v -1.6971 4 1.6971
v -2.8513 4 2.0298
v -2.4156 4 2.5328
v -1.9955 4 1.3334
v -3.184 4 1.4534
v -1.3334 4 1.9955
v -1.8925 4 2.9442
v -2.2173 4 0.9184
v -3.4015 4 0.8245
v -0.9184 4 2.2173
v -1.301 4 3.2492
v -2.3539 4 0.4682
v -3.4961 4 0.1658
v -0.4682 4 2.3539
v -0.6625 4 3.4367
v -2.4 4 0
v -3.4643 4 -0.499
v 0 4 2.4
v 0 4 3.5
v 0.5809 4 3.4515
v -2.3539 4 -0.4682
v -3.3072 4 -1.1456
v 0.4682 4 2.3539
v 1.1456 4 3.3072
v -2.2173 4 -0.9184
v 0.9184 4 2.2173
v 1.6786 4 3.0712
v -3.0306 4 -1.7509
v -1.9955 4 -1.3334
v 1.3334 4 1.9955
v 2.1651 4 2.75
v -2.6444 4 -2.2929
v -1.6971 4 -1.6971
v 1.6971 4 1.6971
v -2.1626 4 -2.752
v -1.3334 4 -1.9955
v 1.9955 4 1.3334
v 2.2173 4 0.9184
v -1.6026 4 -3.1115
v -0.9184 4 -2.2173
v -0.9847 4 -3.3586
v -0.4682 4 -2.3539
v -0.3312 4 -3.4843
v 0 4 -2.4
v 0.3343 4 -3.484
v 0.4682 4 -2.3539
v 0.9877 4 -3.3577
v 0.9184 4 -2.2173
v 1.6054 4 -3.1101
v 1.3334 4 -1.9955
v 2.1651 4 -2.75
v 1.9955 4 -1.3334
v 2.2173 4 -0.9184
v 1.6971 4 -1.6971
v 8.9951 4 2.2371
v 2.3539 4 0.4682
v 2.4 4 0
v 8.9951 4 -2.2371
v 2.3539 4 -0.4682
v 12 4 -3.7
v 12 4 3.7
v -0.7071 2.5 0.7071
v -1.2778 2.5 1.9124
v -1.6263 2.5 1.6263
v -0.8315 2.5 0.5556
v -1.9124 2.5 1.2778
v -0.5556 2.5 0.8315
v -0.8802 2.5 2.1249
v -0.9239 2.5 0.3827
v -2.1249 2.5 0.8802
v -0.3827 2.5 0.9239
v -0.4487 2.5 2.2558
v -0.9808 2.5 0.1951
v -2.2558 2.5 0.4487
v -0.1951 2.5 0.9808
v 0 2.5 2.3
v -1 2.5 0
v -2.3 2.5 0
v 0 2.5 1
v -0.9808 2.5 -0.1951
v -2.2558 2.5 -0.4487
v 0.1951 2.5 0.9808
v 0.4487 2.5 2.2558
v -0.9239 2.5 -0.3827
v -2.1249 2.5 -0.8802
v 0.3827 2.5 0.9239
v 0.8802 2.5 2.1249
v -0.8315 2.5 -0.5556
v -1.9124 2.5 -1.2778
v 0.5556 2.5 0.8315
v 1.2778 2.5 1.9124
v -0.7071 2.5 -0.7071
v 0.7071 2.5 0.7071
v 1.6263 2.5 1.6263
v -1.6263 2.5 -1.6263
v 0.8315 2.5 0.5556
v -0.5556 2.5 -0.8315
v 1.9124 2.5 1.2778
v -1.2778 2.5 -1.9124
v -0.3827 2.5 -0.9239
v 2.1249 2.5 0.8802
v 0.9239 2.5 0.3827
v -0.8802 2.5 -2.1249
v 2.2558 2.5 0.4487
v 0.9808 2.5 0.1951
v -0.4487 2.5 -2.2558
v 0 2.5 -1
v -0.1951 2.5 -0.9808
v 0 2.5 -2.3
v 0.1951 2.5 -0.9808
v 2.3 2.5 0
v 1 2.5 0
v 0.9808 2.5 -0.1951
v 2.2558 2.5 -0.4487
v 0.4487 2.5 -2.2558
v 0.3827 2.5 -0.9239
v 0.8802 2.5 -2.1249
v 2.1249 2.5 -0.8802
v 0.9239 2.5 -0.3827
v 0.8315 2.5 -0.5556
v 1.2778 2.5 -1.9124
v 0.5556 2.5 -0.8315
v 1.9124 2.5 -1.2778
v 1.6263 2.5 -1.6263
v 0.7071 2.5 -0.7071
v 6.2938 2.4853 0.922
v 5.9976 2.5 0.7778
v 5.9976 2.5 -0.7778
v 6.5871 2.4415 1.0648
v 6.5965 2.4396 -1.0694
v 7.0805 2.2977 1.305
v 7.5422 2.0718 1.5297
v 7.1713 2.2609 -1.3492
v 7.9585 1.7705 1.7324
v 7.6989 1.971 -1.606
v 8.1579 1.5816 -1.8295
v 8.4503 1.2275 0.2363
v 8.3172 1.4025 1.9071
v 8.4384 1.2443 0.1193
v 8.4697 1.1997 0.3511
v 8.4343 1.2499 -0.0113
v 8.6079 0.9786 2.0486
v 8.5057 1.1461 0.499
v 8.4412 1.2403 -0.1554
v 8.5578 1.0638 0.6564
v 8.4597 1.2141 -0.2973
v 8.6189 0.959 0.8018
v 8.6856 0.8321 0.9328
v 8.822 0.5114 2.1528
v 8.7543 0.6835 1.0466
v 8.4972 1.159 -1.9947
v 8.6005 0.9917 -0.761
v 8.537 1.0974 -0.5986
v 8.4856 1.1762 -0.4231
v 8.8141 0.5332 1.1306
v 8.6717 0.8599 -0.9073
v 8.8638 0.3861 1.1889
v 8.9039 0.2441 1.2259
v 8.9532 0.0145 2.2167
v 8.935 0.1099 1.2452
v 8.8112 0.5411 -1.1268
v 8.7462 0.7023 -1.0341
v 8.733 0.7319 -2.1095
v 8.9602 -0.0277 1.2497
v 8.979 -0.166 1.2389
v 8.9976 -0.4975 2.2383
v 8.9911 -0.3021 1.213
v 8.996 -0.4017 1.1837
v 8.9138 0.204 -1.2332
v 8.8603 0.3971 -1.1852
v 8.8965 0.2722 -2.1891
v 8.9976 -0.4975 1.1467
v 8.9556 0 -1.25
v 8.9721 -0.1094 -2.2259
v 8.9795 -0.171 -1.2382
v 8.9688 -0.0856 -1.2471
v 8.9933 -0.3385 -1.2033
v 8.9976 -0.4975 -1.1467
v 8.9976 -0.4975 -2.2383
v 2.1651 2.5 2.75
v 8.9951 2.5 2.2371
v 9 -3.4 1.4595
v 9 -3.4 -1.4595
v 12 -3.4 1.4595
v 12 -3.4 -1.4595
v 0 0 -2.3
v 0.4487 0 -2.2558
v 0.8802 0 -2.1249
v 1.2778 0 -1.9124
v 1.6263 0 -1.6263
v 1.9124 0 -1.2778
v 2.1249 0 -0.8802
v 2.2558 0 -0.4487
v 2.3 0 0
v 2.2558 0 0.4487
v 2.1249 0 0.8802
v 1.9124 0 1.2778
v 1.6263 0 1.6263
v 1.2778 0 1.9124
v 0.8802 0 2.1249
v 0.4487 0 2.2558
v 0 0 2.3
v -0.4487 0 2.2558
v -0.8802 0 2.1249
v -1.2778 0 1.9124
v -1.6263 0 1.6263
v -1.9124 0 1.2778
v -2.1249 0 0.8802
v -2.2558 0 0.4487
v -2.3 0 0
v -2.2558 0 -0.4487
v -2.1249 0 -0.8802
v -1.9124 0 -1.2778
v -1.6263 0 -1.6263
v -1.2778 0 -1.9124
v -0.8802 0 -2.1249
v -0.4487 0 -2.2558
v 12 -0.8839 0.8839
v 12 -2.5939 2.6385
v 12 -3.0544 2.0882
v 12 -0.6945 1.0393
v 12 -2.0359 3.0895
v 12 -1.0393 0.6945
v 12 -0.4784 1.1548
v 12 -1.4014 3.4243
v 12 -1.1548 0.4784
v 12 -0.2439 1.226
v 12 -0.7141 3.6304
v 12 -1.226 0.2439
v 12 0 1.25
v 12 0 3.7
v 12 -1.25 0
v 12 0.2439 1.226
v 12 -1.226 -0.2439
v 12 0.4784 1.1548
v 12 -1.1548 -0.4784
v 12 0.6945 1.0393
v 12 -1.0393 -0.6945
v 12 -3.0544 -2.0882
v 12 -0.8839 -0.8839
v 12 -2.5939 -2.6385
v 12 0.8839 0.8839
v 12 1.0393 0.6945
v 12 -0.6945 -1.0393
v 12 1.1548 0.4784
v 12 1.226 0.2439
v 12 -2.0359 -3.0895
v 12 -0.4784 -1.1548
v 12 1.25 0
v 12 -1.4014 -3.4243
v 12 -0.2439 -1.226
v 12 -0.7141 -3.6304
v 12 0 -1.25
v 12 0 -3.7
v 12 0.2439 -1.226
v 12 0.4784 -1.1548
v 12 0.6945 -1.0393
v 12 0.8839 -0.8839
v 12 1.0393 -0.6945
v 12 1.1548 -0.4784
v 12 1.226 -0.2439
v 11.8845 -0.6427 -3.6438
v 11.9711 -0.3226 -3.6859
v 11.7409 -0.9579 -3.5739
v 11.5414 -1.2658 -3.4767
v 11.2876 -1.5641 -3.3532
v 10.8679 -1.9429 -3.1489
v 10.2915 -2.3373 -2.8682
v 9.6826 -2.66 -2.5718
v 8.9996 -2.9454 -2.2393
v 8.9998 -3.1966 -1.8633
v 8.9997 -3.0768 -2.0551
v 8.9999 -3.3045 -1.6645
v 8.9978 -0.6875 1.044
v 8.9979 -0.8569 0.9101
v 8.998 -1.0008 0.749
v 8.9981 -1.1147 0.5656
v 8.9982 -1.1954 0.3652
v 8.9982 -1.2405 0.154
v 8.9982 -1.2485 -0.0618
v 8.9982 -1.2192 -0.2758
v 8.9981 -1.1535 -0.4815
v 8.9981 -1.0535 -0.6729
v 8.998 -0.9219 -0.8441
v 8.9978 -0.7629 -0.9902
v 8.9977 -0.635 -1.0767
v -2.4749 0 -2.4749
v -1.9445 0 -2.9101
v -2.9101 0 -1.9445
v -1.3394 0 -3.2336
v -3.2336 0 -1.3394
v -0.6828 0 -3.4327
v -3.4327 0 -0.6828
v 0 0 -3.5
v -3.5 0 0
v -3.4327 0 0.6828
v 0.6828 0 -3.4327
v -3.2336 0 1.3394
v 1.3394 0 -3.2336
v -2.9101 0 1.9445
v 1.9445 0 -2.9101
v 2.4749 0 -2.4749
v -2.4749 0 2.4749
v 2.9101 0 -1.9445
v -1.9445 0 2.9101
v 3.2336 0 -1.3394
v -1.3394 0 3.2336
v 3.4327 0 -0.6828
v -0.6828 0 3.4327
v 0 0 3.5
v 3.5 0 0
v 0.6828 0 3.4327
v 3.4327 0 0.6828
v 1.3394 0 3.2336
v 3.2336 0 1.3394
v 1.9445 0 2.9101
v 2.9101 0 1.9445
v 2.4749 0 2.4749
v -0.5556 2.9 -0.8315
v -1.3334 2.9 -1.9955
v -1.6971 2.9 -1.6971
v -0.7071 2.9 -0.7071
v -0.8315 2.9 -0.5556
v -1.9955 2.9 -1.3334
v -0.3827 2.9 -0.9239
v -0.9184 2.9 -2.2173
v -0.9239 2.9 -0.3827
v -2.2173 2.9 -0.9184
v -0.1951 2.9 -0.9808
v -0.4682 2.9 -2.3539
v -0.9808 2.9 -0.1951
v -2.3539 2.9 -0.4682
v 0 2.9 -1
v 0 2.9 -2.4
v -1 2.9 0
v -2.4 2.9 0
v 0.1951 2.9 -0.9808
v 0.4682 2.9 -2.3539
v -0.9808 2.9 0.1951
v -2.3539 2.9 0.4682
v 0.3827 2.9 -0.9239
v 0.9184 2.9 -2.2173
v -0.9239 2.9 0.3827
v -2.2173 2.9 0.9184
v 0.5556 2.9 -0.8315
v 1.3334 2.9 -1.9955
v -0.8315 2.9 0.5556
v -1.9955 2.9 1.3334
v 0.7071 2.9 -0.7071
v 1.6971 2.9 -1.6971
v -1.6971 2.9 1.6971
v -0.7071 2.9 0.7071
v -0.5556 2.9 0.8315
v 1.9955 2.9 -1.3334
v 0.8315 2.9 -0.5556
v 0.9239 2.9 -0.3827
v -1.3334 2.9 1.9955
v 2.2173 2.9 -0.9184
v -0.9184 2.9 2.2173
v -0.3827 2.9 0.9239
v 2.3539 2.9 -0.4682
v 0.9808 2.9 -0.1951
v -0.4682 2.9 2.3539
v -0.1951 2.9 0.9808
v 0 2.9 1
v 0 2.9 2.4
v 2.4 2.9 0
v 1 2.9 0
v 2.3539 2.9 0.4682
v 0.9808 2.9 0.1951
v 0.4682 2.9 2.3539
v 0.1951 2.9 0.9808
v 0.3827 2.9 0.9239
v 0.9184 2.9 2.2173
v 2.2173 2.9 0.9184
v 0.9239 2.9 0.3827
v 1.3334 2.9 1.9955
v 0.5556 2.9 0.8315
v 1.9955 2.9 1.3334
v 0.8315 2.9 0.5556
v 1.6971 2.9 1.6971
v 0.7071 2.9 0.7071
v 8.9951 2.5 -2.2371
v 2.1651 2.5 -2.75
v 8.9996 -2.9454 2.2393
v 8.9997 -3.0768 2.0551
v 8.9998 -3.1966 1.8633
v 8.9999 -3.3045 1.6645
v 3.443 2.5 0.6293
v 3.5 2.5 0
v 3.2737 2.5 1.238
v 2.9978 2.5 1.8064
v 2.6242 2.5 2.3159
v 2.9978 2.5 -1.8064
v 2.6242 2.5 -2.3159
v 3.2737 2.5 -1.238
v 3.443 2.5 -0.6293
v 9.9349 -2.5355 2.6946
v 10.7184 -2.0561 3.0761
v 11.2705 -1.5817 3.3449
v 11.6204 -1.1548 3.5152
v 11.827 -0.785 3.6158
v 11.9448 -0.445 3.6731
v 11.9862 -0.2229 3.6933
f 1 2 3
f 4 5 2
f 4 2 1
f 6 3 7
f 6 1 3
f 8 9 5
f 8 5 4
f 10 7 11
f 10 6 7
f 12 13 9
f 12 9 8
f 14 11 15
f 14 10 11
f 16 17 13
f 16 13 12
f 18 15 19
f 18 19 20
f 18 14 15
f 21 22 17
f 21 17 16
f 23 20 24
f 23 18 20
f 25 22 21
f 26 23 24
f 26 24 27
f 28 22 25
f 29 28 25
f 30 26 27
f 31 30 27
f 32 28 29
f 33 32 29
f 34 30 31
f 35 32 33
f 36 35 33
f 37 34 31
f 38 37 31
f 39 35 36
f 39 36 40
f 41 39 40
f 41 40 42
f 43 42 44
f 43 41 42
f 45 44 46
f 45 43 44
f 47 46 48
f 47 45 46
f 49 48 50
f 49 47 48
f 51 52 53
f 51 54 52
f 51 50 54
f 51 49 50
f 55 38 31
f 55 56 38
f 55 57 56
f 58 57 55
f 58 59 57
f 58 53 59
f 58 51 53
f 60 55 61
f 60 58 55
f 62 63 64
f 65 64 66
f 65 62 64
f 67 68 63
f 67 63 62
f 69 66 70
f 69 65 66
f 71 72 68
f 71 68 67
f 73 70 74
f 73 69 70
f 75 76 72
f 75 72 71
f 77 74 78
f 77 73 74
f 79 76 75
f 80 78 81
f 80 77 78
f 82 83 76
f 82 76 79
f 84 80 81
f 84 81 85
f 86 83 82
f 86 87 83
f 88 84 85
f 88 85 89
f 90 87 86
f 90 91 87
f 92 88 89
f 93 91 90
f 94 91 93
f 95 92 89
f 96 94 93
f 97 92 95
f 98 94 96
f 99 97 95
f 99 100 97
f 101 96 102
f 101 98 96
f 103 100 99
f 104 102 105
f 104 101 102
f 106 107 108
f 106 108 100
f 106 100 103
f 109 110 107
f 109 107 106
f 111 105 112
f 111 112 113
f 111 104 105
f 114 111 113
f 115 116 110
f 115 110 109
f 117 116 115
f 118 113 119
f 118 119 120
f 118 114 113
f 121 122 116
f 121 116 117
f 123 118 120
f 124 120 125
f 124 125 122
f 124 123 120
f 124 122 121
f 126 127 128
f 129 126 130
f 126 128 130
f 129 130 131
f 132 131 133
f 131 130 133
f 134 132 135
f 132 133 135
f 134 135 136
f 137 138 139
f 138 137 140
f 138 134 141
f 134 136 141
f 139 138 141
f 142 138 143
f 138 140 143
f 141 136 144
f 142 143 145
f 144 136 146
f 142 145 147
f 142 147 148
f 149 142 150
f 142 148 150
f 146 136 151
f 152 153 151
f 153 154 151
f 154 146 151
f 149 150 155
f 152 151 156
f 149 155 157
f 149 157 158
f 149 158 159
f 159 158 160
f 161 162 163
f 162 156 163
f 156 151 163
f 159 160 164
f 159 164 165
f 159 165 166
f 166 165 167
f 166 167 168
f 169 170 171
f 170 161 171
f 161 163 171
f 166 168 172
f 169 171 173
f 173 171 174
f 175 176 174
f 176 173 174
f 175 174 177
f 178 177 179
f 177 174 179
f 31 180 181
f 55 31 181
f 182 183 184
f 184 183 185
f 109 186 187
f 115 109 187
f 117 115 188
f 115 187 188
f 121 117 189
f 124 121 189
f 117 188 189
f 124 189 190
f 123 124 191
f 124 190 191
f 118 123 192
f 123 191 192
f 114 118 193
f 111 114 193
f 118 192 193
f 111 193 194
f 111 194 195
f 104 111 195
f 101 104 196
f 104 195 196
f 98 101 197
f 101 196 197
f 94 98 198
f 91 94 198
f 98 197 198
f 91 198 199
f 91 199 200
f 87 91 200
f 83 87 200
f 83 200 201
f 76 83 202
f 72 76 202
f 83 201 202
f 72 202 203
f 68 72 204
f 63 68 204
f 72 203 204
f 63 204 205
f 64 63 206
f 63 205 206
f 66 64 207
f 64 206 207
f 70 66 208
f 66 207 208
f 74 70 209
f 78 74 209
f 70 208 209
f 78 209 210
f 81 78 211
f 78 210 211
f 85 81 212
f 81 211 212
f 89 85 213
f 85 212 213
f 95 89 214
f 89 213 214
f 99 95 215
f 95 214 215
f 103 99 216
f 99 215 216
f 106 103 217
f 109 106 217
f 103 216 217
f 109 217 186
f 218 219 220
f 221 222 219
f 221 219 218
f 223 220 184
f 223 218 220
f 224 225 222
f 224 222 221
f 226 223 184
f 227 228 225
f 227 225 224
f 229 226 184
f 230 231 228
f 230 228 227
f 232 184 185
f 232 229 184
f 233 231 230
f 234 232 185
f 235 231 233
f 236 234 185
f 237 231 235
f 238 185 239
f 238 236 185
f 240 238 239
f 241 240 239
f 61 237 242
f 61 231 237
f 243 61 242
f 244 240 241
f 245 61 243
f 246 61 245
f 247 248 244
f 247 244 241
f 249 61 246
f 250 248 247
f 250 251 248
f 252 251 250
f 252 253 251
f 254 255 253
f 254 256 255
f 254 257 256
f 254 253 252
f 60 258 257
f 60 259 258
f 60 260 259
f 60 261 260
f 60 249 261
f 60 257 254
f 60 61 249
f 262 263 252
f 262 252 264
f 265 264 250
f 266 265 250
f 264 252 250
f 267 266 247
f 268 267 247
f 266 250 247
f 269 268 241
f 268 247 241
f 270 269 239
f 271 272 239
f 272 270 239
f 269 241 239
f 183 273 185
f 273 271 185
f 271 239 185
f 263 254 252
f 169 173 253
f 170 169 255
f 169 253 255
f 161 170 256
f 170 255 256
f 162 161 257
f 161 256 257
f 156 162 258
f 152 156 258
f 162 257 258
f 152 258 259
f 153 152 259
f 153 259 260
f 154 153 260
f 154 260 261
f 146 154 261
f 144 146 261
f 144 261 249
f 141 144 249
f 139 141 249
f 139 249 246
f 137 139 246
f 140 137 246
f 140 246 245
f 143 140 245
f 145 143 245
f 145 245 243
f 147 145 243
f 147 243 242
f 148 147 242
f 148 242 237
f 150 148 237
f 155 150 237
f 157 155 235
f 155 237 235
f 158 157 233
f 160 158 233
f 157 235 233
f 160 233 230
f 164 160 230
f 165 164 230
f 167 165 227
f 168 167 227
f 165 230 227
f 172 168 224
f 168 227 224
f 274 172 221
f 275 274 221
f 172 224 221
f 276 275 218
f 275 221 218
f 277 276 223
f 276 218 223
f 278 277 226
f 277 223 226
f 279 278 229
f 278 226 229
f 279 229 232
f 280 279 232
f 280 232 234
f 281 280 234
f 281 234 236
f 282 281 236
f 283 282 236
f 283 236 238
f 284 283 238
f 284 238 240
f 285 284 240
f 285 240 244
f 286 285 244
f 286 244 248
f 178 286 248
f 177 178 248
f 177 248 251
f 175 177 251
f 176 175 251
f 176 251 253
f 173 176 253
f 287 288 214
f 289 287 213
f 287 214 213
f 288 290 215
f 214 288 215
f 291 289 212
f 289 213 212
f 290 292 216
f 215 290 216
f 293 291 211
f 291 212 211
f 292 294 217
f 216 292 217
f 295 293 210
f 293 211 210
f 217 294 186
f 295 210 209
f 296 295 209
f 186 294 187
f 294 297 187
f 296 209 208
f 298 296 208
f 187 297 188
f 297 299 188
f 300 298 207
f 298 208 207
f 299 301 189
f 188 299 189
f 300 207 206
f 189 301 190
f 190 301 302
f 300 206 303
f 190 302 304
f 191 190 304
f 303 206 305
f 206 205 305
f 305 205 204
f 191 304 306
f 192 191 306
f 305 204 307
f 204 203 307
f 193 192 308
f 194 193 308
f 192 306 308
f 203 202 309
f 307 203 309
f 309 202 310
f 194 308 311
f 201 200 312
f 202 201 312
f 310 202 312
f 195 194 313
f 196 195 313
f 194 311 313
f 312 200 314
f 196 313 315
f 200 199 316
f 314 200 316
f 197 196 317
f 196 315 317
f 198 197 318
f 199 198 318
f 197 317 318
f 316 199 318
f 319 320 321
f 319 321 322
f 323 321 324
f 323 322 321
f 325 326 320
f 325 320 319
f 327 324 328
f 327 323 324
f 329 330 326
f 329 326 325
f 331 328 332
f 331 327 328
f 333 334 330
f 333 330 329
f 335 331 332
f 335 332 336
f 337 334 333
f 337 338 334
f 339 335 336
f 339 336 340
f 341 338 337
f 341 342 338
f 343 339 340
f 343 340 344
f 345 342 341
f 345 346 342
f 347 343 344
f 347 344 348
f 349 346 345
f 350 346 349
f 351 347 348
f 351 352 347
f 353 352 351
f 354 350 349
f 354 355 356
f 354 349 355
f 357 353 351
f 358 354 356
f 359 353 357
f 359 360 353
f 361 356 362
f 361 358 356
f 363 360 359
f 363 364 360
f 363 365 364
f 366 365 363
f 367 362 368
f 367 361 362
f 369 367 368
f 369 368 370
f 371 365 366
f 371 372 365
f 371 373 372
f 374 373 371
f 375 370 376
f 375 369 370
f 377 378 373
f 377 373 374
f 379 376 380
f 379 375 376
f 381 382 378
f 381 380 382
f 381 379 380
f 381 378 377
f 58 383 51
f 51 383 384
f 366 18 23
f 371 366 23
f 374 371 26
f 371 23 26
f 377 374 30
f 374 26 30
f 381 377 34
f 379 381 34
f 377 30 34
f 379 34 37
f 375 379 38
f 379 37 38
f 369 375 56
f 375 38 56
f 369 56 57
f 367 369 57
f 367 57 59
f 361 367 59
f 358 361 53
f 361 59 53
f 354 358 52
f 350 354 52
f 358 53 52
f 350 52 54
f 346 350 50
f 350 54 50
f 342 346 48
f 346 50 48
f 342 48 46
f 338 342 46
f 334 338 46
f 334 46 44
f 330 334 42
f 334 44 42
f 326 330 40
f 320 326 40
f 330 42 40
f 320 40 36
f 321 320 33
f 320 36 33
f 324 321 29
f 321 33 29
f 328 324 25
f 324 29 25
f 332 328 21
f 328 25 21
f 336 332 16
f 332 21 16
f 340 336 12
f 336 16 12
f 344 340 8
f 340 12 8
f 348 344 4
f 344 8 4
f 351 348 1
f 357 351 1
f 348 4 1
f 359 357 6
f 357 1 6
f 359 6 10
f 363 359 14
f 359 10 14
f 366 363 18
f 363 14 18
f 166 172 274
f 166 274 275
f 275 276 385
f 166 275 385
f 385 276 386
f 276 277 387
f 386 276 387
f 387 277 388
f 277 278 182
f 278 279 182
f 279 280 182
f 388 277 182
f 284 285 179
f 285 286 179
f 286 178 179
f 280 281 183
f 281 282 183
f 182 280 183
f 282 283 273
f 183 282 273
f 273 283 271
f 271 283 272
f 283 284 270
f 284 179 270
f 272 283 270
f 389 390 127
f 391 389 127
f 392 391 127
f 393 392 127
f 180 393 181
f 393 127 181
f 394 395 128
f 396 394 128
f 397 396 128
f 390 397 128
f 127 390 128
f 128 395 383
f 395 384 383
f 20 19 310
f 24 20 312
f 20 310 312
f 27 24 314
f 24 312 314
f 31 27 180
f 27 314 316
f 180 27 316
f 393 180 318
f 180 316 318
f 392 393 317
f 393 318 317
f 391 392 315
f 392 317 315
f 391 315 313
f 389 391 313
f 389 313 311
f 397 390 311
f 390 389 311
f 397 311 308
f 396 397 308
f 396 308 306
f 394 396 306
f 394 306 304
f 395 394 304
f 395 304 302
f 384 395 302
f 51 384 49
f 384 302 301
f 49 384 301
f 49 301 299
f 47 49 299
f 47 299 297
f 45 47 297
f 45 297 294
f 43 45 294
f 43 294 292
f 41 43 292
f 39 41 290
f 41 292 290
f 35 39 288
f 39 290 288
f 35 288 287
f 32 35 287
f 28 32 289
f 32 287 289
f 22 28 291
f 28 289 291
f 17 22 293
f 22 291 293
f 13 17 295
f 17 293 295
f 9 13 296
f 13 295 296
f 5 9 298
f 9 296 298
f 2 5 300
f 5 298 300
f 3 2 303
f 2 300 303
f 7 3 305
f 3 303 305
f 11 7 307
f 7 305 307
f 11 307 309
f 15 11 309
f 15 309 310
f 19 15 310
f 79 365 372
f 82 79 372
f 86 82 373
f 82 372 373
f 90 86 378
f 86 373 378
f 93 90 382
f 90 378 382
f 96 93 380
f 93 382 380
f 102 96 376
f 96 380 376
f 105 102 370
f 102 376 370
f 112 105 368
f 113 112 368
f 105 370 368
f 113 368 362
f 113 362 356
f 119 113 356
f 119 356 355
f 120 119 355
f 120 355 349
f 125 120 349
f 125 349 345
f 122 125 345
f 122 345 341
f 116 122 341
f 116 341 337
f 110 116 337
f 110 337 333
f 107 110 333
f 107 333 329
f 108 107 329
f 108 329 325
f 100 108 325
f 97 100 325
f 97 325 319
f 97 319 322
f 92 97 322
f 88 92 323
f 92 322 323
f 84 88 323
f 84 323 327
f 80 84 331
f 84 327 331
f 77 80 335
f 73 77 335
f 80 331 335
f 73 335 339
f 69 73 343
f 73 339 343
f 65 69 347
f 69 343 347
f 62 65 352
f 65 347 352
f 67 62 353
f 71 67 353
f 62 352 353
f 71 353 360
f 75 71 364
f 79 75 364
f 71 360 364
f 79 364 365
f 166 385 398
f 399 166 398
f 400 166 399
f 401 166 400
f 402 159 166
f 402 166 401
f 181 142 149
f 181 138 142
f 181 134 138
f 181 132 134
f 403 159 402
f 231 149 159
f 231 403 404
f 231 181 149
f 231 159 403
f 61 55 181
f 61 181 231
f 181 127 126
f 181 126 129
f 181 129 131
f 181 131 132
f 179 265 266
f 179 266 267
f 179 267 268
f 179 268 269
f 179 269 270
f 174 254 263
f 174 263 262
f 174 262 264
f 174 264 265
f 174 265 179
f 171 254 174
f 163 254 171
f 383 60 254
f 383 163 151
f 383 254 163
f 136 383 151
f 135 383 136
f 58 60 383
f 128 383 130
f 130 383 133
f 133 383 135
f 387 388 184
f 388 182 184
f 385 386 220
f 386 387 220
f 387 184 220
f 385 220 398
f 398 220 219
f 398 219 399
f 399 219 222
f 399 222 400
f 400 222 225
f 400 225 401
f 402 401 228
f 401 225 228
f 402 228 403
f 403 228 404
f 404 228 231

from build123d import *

# Parameters (mm, degrees)
SKETCH_1_R               = 3.5
EXTRUDE_1_DEPTH          = 4
SKETCH_2_R               = 2.4
CUT_EXTRUDE_1_DEPTH      = 1.1
SKETCH_3_R               = 1
CUT_EXTRUDE_2_DEPTH      = 6.736723804
SKETCH_4_R               = 2.3
CUT_EXTRUDE_3_DEPTH      = 2.5
EXTRUDE_START            = -1.5
EXTRUDE_2_DEPTH          = 1.5
EXTRUDE_3_DEPTH          = 7.4
CUT_EXTRUDE_4_DEPTH      = 17.902366698
CUT_EXTRUDE_4_DEPTH_BACK = 17.902366698
SKETCH_10_R              = 1.25
CUT_EXTRUDE_5_DEPTH      = 7.4


with BuildPart() as part:
    # Эскиз1 → Бобышка-Вытянуть1 (new body)
    with BuildSketch(Plane(origin=(0, 0, 0), x_dir=(1, 0, 0), z_dir=(0, 1, 0))):
        with Locations(Location((0, 0, 0), (0, 0, 270))):
            Circle(SKETCH_1_R)
    extrude(amount=EXTRUDE_1_DEPTH)

    # Эскиз2 → Вырез-Вытянуть1 (cut)
    with BuildSketch(Plane(origin=(0, 4, 0), x_dir=(1, 0, 0), z_dir=(0, 1, 0))):
        with Locations(Location((0, 0, 0), (0, 0, 270))):
            Circle(SKETCH_2_R)
    extrude(amount=-CUT_EXTRUDE_1_DEPTH, mode=Mode.SUBTRACT)

    # Эскиз3 → Вырез-Вытянуть2 (cut, through all)
    with BuildSketch(Plane(origin=(0, 2.9, 0), x_dir=(1, 0, 0), z_dir=(0, 1, 0))):
        with Locations(Location((0, 0, 0), (0, 0, 270))):
            Circle(SKETCH_3_R)
    extrude(amount=-CUT_EXTRUDE_2_DEPTH, mode=Mode.SUBTRACT)

    # Эскиз4 → Вырез-Вытянуть3 (cut)
    with BuildSketch(Plane(origin=(0, 0, 0), x_dir=(-1, 0, 0), z_dir=(0, -1, 0))):
        with Locations(Location((0, 0, 0), (0, 0, 90))):
            Circle(SKETCH_4_R)
    extrude(amount=-CUT_EXTRUDE_3_DEPTH, mode=Mode.SUBTRACT)

    # Эскиз5 → Бобышка-Вытянуть2 (add)
    with BuildSketch(Plane(origin=(0, 4, 0), x_dir=(1, 0, 0), z_dir=(0, 1, 0)).offset(EXTRUDE_START)):
        with BuildLine():
            Line((14.15, 1.85), (2.165063509, 2.75))
            ThreePointArc((2.165063509, 2.75), (3.5, 0), (2.165063509, -2.75))
            Line((2.165063509, -2.75), (14.15, -1.85))
            ThreePointArc((14.15, -1.85), (16, 0), (14.15, 1.85))
        make_face()
    extrude(amount=EXTRUDE_2_DEPTH)

    # Эскиз6 → Бобышка-Вытянуть3 (add)
    with BuildSketch(Plane(origin=(0, 4, 0), x_dir=(1, 0, 0), z_dir=(0, 1, 0))):
        Polygon((12, 0), (12, 3.7), (4.4, 0), (12, -3.7), align=None)
    extrude(amount=-EXTRUDE_3_DEPTH)

    # Эскиз9 → Вырез-Вытянуть4 (cut, two sides: drawn at the far end of the back side and taken through both)
    with BuildSketch(Plane.XY.offset(-CUT_EXTRUDE_4_DEPTH_BACK)):
        with BuildLine():
            ThreePointArc((5.997603859, 2.5), (8.11804802, 1.622196165), (8.997602836, -0.497522293))
            Line((8.997602836, -0.497522293), (9, -3.4))
            Line((9, -3.4), (2.724891775, -4.807995463))
            Line((2.724891775, -4.807995463), (4.4, 2.5))
            Line((4.4, 2.5), (5.997603859, 2.5))
        make_face()
        Polygon((17.66550591, -1.447270523), (12, 2.5), (12, 6.114360592), (17.66550591, 6.114360592), align=None)
    extrude(amount=CUT_EXTRUDE_4_DEPTH + CUT_EXTRUDE_4_DEPTH_BACK, mode=Mode.SUBTRACT)

    # Эскиз10 → Вырез-Вытянуть5 (cut)
    with BuildSketch(Plane(origin=(12, 0, 0), x_dir=(0, 0, -1), z_dir=(1, 0, 0))):
        Circle(SKETCH_10_R)
        with BuildLine():
            Line((-3.7, 0), (-6.427289466, -4.290908474))
            Line((-6.427289466, -4.290908474), (7.207363266, -4.845162651))
            Line((7.207363266, -4.845162651), (3.7, 0))
            ThreePointArc((3.7, 0), (0, -3.7), (-3.7, 0))
        make_face()
    extrude(amount=-CUT_EXTRUDE_5_DEPTH, mode=Mode.SUBTRACT)


solid = part.part
